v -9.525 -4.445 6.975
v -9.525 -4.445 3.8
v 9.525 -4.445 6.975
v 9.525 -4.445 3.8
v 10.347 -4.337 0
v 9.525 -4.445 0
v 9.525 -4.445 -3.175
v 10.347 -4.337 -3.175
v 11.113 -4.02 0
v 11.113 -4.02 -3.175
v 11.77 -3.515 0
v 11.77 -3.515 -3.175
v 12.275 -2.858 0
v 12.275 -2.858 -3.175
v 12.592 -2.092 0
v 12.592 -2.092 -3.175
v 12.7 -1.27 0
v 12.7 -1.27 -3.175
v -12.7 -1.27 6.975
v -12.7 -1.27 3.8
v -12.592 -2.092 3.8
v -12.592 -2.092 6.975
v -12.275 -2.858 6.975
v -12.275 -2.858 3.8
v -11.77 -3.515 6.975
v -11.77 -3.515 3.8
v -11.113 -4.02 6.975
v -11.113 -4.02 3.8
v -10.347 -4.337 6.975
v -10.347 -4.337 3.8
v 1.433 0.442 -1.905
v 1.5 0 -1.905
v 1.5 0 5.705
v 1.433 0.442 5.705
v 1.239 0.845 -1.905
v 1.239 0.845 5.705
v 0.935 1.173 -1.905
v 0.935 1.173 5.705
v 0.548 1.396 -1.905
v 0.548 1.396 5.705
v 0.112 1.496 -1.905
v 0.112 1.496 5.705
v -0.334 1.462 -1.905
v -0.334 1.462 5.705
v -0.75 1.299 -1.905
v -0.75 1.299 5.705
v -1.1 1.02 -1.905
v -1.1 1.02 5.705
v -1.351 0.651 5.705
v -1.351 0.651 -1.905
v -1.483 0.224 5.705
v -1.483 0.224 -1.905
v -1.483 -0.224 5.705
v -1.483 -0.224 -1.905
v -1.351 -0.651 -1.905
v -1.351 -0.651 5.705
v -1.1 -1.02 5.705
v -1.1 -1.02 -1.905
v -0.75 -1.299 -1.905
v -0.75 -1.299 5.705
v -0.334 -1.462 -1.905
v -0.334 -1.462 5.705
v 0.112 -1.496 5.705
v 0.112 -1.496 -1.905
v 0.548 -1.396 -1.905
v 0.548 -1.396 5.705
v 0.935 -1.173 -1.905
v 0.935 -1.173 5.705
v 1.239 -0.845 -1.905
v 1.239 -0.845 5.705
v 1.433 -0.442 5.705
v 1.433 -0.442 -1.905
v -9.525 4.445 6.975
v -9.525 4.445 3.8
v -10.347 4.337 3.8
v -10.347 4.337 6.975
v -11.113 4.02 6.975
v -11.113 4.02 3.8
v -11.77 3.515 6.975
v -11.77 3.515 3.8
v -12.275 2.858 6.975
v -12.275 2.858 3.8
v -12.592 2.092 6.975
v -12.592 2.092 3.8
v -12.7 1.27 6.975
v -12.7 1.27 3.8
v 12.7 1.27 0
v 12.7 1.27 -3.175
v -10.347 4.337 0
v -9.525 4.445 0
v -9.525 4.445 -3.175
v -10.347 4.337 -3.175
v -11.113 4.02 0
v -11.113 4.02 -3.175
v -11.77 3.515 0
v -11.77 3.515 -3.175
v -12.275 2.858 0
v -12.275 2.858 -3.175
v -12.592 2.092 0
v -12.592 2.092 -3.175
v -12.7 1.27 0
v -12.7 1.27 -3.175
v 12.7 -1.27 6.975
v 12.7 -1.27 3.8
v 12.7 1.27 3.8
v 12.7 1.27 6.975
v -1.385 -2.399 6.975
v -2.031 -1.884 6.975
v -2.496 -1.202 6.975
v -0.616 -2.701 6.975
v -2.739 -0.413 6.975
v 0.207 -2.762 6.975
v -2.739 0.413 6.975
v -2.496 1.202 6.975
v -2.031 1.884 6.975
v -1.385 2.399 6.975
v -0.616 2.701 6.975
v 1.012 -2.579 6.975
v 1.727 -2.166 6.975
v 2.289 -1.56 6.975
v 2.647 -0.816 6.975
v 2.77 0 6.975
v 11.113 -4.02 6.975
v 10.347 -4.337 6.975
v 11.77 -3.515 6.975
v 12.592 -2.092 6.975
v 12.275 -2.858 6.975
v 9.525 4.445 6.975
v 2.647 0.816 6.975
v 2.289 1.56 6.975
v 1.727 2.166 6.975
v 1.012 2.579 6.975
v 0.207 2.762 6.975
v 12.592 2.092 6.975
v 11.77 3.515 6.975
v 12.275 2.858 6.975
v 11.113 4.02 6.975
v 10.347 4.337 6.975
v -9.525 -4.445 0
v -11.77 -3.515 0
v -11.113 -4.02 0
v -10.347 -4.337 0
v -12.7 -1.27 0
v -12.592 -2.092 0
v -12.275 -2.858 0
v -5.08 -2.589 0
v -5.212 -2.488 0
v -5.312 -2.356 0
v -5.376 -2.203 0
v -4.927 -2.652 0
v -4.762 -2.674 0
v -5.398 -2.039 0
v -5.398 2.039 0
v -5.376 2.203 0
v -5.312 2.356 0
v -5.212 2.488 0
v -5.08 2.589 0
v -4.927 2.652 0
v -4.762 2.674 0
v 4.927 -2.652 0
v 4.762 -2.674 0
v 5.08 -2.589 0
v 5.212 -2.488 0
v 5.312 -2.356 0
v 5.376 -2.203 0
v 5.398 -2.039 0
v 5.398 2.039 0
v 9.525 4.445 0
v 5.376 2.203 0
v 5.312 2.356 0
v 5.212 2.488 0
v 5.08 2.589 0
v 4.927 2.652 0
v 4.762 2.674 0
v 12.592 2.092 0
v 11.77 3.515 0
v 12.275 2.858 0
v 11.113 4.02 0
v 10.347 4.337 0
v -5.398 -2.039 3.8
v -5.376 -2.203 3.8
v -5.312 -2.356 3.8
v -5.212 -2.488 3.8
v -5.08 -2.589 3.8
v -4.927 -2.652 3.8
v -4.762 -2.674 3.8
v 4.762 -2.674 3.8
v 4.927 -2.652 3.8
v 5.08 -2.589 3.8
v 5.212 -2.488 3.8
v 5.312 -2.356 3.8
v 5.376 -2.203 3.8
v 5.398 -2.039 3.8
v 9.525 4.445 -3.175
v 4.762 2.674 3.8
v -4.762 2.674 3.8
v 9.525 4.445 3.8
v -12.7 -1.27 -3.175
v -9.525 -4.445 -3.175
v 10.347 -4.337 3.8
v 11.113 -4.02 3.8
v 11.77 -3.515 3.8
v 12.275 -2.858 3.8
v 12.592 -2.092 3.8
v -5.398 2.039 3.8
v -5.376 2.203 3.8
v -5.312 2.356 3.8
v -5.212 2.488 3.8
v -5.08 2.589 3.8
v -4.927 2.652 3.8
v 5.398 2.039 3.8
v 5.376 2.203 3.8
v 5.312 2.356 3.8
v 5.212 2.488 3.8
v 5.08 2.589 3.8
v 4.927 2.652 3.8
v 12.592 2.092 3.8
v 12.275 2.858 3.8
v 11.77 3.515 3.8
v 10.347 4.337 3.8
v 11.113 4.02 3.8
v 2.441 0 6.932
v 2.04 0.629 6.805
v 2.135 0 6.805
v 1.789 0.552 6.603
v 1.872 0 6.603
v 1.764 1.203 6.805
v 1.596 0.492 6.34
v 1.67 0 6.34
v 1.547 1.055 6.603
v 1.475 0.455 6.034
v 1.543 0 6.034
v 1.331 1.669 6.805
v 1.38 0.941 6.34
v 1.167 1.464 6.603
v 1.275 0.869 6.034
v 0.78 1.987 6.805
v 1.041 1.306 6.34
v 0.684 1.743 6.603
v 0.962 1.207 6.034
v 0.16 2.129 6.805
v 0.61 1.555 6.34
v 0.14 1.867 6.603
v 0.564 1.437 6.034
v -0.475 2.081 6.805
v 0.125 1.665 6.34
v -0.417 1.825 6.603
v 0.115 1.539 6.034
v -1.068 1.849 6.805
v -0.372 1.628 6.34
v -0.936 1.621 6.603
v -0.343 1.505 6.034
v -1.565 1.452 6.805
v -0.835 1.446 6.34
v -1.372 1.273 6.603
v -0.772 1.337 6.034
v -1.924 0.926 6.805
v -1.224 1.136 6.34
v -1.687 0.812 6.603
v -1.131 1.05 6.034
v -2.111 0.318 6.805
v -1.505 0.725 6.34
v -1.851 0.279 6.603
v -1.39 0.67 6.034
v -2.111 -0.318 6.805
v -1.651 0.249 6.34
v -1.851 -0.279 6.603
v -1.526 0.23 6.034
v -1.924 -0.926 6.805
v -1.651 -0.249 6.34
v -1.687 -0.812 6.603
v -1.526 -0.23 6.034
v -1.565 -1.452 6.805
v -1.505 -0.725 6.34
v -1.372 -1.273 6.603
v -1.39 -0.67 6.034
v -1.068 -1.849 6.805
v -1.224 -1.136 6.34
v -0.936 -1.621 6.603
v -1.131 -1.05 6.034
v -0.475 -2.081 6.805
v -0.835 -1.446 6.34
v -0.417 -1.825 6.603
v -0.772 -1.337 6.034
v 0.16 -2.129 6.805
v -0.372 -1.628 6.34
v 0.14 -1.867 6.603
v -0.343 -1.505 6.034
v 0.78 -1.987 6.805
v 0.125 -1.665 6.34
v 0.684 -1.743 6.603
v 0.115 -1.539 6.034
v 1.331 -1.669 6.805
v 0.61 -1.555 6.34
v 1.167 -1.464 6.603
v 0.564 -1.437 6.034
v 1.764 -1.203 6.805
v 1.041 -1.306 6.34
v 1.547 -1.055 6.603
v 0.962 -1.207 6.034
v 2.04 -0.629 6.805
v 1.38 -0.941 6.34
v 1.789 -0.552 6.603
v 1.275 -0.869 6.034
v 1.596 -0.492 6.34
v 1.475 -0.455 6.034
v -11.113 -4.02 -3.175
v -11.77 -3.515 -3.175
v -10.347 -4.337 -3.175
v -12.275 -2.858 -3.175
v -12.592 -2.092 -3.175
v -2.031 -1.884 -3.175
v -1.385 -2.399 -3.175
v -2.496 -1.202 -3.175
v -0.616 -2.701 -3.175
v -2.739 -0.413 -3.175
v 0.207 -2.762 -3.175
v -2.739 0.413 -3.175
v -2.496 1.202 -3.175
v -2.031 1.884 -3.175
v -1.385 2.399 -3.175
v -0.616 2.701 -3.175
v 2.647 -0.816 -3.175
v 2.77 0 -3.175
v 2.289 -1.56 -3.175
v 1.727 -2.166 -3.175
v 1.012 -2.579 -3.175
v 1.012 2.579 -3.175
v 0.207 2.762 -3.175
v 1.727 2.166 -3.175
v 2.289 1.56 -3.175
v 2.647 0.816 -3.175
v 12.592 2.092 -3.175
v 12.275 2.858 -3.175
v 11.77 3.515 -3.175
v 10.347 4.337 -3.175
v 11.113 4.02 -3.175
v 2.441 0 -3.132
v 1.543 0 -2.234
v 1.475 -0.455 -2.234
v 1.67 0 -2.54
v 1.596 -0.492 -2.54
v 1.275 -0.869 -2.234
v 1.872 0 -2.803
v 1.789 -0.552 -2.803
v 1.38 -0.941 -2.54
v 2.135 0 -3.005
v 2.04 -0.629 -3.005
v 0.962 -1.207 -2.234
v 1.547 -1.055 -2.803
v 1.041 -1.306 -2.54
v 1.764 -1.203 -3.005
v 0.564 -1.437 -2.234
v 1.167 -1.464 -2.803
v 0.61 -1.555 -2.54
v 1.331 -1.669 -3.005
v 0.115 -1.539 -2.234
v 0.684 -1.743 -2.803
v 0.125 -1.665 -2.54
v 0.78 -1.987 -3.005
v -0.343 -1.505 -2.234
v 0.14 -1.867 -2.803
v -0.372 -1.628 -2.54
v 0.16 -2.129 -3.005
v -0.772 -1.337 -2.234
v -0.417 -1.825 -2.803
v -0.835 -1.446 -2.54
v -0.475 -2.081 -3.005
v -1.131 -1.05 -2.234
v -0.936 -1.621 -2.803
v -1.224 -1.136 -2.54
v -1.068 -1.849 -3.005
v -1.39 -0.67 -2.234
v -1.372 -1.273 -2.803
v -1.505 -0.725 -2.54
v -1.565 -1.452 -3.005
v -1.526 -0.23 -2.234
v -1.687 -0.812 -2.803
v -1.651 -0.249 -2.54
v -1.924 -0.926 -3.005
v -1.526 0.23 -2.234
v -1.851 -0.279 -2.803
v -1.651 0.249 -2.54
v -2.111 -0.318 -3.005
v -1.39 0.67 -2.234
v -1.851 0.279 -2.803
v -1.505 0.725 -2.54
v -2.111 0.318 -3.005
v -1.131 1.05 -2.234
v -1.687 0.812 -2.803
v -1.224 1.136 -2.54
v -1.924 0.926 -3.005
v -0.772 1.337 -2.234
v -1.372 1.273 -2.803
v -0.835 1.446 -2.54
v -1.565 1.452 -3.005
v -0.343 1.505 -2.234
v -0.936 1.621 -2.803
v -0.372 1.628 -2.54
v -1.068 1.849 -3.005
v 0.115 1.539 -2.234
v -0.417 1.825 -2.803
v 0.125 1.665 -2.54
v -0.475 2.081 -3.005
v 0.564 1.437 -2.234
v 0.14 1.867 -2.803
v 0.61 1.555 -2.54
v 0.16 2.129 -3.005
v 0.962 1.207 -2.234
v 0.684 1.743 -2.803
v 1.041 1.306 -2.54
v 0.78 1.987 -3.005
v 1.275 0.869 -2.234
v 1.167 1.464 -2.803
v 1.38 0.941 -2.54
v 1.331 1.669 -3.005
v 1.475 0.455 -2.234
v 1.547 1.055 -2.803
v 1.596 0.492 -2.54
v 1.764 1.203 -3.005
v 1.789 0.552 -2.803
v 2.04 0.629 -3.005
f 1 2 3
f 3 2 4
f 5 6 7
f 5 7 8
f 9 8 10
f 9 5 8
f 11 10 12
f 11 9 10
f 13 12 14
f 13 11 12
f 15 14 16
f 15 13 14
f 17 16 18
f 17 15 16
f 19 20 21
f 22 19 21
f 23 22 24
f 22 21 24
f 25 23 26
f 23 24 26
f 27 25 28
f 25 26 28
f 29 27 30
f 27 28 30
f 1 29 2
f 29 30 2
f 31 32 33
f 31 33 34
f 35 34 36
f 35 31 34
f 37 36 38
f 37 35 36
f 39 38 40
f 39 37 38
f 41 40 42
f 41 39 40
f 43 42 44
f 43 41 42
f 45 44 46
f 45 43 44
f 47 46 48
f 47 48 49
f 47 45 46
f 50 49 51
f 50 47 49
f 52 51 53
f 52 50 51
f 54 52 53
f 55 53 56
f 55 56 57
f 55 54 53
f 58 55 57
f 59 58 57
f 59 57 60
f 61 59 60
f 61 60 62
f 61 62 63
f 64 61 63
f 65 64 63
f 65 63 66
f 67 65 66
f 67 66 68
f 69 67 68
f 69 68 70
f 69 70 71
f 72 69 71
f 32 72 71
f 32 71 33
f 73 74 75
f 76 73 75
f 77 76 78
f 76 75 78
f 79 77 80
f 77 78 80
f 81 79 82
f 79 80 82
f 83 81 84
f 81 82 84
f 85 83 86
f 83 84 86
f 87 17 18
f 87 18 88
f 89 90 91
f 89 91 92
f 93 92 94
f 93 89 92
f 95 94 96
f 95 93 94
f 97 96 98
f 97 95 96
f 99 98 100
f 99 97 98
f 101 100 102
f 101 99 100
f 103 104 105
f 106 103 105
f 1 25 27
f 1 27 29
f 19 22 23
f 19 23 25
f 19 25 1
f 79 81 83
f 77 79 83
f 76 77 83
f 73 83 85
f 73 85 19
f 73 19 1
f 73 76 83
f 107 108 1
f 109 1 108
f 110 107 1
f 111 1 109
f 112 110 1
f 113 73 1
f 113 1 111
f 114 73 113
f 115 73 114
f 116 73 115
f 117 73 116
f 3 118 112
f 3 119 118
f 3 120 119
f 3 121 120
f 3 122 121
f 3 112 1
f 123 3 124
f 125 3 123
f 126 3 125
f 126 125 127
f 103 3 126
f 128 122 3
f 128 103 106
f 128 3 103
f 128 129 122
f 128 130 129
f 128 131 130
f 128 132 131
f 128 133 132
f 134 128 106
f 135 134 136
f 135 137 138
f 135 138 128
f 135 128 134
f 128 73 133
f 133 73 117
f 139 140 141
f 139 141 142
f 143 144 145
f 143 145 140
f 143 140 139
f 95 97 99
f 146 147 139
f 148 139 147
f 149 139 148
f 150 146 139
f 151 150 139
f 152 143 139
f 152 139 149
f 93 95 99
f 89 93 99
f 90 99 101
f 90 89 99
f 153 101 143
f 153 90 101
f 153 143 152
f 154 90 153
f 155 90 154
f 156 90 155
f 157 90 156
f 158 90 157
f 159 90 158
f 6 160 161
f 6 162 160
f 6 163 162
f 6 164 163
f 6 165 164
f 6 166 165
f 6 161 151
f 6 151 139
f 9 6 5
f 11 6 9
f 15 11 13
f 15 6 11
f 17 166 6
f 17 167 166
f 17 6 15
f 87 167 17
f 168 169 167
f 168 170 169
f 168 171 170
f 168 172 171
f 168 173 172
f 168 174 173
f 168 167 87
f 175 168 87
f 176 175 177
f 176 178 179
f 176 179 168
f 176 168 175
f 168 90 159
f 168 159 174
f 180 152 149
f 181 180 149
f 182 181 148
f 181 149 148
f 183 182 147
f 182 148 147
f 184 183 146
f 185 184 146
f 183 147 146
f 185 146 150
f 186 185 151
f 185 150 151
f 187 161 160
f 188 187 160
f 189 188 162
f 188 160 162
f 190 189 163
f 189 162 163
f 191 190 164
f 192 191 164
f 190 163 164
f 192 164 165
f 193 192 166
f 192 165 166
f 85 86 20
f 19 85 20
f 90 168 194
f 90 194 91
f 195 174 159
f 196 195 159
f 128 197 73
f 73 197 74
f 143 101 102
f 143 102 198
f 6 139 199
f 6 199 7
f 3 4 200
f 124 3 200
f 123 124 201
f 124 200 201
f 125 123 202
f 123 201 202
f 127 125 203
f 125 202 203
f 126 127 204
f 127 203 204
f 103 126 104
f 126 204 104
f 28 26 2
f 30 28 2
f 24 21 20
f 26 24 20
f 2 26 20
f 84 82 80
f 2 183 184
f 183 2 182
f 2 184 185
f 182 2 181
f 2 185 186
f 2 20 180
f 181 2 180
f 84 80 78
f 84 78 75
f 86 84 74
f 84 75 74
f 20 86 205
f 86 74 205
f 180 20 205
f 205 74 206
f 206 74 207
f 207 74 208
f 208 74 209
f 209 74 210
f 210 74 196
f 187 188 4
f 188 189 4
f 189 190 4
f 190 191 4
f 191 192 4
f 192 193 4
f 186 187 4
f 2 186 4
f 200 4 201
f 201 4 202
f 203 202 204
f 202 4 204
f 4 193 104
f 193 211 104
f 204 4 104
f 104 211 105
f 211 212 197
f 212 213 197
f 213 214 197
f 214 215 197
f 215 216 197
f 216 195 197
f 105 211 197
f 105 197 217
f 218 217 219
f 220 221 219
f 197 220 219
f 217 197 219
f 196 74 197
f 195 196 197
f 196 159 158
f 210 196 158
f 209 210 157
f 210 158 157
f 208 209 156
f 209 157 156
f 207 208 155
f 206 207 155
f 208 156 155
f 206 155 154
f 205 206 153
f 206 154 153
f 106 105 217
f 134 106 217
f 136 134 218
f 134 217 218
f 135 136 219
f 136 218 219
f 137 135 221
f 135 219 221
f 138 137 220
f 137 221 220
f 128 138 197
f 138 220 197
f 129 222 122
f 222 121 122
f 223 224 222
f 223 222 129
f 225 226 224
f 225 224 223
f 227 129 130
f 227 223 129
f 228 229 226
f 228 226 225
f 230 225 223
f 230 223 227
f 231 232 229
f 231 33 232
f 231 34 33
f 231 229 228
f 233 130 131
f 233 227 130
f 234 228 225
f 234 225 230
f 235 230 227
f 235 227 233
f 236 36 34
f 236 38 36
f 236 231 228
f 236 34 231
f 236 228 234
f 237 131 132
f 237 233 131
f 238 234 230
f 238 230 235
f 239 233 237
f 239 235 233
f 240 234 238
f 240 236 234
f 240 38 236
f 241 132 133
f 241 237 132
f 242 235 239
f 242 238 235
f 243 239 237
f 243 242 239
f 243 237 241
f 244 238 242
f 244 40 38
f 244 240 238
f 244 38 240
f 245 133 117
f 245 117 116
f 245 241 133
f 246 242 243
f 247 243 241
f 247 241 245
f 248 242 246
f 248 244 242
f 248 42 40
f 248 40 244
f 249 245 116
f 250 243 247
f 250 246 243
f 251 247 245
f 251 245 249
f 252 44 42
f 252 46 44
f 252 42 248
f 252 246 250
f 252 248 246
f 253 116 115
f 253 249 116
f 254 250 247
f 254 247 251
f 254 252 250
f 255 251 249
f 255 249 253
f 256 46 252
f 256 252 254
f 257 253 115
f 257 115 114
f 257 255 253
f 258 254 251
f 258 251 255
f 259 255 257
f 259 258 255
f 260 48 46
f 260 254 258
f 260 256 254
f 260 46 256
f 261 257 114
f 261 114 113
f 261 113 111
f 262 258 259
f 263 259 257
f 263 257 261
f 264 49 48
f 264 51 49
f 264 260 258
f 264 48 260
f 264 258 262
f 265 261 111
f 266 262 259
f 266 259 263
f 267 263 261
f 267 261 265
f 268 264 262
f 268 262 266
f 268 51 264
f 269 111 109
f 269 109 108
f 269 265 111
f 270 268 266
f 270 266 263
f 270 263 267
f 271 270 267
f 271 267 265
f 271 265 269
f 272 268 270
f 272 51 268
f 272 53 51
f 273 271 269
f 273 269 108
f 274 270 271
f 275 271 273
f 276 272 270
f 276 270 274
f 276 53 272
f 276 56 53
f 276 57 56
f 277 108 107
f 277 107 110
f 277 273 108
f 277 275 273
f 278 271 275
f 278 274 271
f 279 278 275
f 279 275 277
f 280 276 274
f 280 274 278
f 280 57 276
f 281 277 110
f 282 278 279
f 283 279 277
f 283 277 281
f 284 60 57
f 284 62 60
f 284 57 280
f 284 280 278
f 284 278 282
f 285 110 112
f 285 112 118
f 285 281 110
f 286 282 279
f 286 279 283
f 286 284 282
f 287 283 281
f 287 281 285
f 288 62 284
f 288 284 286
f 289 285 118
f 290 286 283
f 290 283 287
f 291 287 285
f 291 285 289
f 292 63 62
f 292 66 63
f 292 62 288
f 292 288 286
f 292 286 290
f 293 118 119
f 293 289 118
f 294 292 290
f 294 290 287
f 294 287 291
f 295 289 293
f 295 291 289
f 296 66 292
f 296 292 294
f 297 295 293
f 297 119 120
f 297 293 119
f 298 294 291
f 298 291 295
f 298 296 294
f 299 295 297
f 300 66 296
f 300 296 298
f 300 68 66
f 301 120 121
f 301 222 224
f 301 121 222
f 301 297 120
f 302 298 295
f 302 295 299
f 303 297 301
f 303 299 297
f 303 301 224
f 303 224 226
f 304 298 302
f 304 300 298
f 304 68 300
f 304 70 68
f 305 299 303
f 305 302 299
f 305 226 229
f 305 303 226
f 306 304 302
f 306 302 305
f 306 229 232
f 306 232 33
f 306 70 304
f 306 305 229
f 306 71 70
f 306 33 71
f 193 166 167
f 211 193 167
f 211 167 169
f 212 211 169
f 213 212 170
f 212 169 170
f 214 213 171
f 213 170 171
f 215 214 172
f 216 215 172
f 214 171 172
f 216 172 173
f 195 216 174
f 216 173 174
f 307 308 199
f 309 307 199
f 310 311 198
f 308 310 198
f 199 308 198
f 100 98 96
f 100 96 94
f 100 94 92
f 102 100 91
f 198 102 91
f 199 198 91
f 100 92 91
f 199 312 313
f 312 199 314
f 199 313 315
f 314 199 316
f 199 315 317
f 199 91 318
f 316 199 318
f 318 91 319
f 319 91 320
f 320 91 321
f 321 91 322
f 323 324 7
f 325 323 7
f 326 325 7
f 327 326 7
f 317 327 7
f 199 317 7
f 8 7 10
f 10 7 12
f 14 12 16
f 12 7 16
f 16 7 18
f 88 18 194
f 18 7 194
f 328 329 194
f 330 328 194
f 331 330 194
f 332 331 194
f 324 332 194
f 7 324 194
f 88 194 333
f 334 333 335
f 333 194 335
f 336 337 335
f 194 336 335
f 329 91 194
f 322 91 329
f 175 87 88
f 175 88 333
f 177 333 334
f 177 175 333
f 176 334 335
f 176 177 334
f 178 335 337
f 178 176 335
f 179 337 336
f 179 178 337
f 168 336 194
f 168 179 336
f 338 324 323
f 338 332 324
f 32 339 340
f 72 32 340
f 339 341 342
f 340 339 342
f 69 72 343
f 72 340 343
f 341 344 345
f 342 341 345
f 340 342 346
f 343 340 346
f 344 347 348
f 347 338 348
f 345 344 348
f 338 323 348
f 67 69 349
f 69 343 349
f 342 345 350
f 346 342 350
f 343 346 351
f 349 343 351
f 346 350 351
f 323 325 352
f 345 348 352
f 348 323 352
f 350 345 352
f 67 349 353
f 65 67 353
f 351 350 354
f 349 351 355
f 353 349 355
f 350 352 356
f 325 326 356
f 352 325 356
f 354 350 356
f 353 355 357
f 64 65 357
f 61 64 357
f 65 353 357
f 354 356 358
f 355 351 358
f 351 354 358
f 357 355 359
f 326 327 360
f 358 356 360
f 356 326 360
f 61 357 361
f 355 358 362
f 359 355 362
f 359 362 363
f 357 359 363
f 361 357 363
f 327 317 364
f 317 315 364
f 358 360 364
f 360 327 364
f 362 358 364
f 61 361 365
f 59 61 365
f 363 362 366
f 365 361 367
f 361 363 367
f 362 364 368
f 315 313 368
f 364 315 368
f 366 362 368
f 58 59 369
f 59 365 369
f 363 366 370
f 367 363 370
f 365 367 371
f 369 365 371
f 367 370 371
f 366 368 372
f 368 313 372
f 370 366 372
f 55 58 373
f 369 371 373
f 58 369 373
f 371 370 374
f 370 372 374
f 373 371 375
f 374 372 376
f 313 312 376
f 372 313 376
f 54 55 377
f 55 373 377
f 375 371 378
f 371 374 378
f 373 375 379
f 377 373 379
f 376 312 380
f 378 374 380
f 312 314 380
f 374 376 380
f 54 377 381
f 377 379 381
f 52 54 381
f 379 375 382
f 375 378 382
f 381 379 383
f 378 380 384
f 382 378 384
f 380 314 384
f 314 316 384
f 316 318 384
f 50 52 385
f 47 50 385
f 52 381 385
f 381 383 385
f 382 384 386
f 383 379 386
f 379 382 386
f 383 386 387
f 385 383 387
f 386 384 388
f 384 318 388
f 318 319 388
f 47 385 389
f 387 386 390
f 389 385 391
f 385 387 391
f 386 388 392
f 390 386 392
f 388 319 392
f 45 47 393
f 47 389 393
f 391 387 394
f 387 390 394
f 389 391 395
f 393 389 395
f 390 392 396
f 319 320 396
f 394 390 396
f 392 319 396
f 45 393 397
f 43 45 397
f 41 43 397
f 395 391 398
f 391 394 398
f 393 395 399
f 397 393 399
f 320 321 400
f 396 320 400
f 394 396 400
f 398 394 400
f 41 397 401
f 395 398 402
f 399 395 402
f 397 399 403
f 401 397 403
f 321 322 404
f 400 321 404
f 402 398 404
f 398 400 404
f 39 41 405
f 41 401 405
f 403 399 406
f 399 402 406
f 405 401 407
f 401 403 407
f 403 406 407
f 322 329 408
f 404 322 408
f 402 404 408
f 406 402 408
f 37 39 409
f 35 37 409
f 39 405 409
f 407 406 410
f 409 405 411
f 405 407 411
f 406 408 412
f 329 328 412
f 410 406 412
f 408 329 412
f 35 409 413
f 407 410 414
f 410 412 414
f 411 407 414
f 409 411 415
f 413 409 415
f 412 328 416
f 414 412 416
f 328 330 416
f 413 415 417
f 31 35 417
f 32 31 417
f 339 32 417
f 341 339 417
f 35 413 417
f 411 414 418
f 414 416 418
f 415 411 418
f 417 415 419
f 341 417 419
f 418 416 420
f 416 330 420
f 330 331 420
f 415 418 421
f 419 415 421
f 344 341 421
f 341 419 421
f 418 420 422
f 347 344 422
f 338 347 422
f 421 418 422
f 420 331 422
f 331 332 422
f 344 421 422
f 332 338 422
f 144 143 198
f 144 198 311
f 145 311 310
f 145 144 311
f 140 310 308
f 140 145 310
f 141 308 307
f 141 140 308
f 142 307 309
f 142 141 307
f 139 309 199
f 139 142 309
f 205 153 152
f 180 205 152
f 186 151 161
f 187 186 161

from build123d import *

# Parameters (mm, degrees)
F0_R      = 1.5
F1_DEPTH  = 3.8
F1_FACE_R = 1.5
F2_DEPTH  = 3.175
F3_R      = 1.5
F4_DEPTH  = 3.175
F5_R      = 1.27
F6_R      = 1.27


with BuildPart() as f1:
    # F0 (on Top) → F1 (new body)
    with BuildSketch(Plane.XY):
        with BuildLine():
            ThreePointArc((5.3975, 2.0388861202), (5.2115128061, 2.4878989263), (4.7625, 2.6738861202))
            Line((4.7625, 2.6738861202), (-4.7625, 2.6738861202))
            ThreePointArc((-4.7625, 2.6738861202), (-5.2115128061, 2.4878989263), (-5.3975, 2.0388861202))
            Line((-5.3975, 2.0388861202), (-5.3975, -2.0388861202))
            ThreePointArc((-5.3975, -2.0388861202), (-5.2115128061, -2.4878989263), (-4.7625, -2.6738861202))
            Line((-4.7625, -2.6738861202), (4.7625, -2.6738861202))
            ThreePointArc((4.7625, -2.6738861202), (5.2115128061, -2.4878989263), (5.3975, -2.0388861202))
            Line((5.3975, -2.0388861202), (5.3975, 2.0388861202))
        make_face()
        Circle(F0_R, mode=Mode.SUBTRACT)
    extrude(amount=F1_DEPTH)

    # F0 (on Top) + F1_face (on face) → F2 (join)
    with BuildSketch(Plane.XY):
        with BuildLine():
            ThreePointArc((12.7, 1.27), (11.7700640303, 3.5150640303), (9.525, 4.445))
            Line((9.525, 4.445), (-9.525, 4.445))
            ThreePointArc((-9.525, 4.445), (-11.7700640303, 3.5150640303), (-12.7, 1.27))
            Line((-12.7, 1.27), (-12.7, -1.27))
            ThreePointArc((-12.7, -1.27), (-11.7700640303, -3.5150640303), (-9.525, -4.445))
            Line((-9.525, -4.445), (9.525, -4.445))
            ThreePointArc((9.525, -4.445), (11.7700640303, -3.5150640303), (12.7, -1.27))
            Line((12.7, -1.27), (12.7, 1.27))
        make_face()
        with BuildLine():
            Line((-4.7625, 2.6738861202), (4.7625, 2.6738861202))
            ThreePointArc((4.7625, 2.6738861202), (5.2115128061, 2.4878989263), (5.3975, 2.0388861202))
            Line((5.3975, 2.0388861202), (5.3975, -2.0388861202))
            ThreePointArc((5.3975, -2.0388861202), (5.2115128061, -2.4878989263), (4.7625, -2.6738861202))
            Line((4.7625, -2.6738861202), (-4.7625, -2.6738861202))
            ThreePointArc((-4.7625, -2.6738861202), (-5.2115128061, -2.4878989263), (-5.3975, -2.0388861202))
            Line((-5.3975, -2.0388861202), (-5.3975, 2.0388861202))
            ThreePointArc((-5.3975, 2.0388861202), (-5.2115128061, 2.4878989263), (-4.7625, 2.6738861202))
        make_face(mode=Mode.SUBTRACT)
    with BuildSketch(Plane(origin=(0, 0, 0), x_dir=(1, 0, 0), z_dir=(0, 0, -1))):
        with BuildLine():
            ThreePointArc((4.7625, -2.6738861202), (5.2115128061, -2.4878989263), (5.3975, -2.0388861202))
            Line((5.3975, -2.0388861202), (5.3975, 2.0388861202))
            ThreePointArc((5.3975, 2.0388861202), (5.2115128061, 2.4878989263), (4.7625, 2.6738861202))
            Line((4.7625, 2.6738861202), (-4.7625, 2.6738861202))
            ThreePointArc((-4.7625, 2.6738861202), (-5.2115128061, 2.4878989263), (-5.3975, 2.0388861202))
            Line((-5.3975, 2.0388861202), (-5.3975, -2.0388861202))
            ThreePointArc((-5.3975, -2.0388861202), (-5.2115128061, -2.4878989263), (-4.7625, -2.6738861202))
            Line((-4.7625, -2.6738861202), (4.7625, -2.6738861202))
        make_face()
        Circle(F1_FACE_R, mode=Mode.SUBTRACT)
    extrude(amount=-F2_DEPTH, dir=(0, 0, 1))

    # F3 (on face) → F4 (join)
    with BuildSketch(Plane.XY.offset(3.8)):
        with BuildLine():
            ThreePointArc((12.7, 1.27), (11.7700640303, 3.5150640303), (9.525, 4.445))
            Line((9.525, 4.445), (-9.525, 4.445))
            ThreePointArc((-9.525, 4.445), (-11.7700640303, 3.5150640303), (-12.7, 1.27))
            Line((-12.7, 1.27), (-12.7, -1.27))
            ThreePointArc((-12.7, -1.27), (-11.7700640303, -3.5150640303), (-9.525, -4.445))
            Line((-9.525, -4.445), (9.525, -4.445))
            ThreePointArc((9.525, -4.445), (11.7700640303, -3.5150640303), (12.7, -1.27))
            Line((12.7, -1.27), (12.7, 1.27))
        make_face()
        with BuildLine():
            ThreePointArc((4.7625, 2.6738861202), (5.2115128061, 2.4878989263), (5.3975, 2.0388861202))
            Line((5.3975, 2.0388861202), (5.3975, -2.0388861202))
            ThreePointArc((5.3975, -2.0388861202), (5.2115128061, -2.4878989263), (4.7625, -2.6738861202))
            Line((4.7625, -2.6738861202), (-4.7625, -2.6738861202))
            ThreePointArc((-4.7625, -2.6738861202), (-5.2115128061, -2.4878989263), (-5.3975, -2.0388861202))
            Line((-5.3975, -2.0388861202), (-5.3975, 2.0388861202))
            ThreePointArc((-5.3975, 2.0388861202), (-5.2115128061, 2.4878989263), (-4.7625, 2.6738861202))
            Line((-4.7625, 2.6738861202), (4.7625, 2.6738861202))
        make_face(mode=Mode.SUBTRACT)
        with BuildLine():
            Line((5.3975, -2.0388861202), (5.3975, 2.0388861202))
            ThreePointArc((5.3975, 2.0388861202), (5.2115128061, 2.4878989263), (4.7625, 2.6738861202))
            Line((4.7625, 2.6738861202), (-4.7625, 2.6738861202))
            ThreePointArc((-4.7625, 2.6738861202), (-5.2115128061, 2.4878989263), (-5.3975, 2.0388861202))
            Line((-5.3975, 2.0388861202), (-5.3975, -2.0388861202))
            ThreePointArc((-5.3975, -2.0388861202), (-5.2115128061, -2.4878989263), (-4.7625, -2.6738861202))
            Line((-4.7625, -2.6738861202), (4.7625, -2.6738861202))
            ThreePointArc((4.7625, -2.6738861202), (5.2115128061, -2.4878989263), (5.3975, -2.0388861202))
        make_face()
        Circle(F3_R, mode=Mode.SUBTRACT)
    extrude(amount=F4_DEPTH)

    # F5
    f5_edges = [f1.edges().sort_by_distance(p)[0] for p in [
        (-1.5, 0, 6.975),
    ]]
    fillet(f5_edges, radius=F5_R)

    # F6
    f6_edges = [f1.edges().sort_by_distance(p)[0] for p in [
        (-1.5, 0, -3.175),
    ]]
    fillet(f6_edges, radius=F6_R)


solid = f1.part
